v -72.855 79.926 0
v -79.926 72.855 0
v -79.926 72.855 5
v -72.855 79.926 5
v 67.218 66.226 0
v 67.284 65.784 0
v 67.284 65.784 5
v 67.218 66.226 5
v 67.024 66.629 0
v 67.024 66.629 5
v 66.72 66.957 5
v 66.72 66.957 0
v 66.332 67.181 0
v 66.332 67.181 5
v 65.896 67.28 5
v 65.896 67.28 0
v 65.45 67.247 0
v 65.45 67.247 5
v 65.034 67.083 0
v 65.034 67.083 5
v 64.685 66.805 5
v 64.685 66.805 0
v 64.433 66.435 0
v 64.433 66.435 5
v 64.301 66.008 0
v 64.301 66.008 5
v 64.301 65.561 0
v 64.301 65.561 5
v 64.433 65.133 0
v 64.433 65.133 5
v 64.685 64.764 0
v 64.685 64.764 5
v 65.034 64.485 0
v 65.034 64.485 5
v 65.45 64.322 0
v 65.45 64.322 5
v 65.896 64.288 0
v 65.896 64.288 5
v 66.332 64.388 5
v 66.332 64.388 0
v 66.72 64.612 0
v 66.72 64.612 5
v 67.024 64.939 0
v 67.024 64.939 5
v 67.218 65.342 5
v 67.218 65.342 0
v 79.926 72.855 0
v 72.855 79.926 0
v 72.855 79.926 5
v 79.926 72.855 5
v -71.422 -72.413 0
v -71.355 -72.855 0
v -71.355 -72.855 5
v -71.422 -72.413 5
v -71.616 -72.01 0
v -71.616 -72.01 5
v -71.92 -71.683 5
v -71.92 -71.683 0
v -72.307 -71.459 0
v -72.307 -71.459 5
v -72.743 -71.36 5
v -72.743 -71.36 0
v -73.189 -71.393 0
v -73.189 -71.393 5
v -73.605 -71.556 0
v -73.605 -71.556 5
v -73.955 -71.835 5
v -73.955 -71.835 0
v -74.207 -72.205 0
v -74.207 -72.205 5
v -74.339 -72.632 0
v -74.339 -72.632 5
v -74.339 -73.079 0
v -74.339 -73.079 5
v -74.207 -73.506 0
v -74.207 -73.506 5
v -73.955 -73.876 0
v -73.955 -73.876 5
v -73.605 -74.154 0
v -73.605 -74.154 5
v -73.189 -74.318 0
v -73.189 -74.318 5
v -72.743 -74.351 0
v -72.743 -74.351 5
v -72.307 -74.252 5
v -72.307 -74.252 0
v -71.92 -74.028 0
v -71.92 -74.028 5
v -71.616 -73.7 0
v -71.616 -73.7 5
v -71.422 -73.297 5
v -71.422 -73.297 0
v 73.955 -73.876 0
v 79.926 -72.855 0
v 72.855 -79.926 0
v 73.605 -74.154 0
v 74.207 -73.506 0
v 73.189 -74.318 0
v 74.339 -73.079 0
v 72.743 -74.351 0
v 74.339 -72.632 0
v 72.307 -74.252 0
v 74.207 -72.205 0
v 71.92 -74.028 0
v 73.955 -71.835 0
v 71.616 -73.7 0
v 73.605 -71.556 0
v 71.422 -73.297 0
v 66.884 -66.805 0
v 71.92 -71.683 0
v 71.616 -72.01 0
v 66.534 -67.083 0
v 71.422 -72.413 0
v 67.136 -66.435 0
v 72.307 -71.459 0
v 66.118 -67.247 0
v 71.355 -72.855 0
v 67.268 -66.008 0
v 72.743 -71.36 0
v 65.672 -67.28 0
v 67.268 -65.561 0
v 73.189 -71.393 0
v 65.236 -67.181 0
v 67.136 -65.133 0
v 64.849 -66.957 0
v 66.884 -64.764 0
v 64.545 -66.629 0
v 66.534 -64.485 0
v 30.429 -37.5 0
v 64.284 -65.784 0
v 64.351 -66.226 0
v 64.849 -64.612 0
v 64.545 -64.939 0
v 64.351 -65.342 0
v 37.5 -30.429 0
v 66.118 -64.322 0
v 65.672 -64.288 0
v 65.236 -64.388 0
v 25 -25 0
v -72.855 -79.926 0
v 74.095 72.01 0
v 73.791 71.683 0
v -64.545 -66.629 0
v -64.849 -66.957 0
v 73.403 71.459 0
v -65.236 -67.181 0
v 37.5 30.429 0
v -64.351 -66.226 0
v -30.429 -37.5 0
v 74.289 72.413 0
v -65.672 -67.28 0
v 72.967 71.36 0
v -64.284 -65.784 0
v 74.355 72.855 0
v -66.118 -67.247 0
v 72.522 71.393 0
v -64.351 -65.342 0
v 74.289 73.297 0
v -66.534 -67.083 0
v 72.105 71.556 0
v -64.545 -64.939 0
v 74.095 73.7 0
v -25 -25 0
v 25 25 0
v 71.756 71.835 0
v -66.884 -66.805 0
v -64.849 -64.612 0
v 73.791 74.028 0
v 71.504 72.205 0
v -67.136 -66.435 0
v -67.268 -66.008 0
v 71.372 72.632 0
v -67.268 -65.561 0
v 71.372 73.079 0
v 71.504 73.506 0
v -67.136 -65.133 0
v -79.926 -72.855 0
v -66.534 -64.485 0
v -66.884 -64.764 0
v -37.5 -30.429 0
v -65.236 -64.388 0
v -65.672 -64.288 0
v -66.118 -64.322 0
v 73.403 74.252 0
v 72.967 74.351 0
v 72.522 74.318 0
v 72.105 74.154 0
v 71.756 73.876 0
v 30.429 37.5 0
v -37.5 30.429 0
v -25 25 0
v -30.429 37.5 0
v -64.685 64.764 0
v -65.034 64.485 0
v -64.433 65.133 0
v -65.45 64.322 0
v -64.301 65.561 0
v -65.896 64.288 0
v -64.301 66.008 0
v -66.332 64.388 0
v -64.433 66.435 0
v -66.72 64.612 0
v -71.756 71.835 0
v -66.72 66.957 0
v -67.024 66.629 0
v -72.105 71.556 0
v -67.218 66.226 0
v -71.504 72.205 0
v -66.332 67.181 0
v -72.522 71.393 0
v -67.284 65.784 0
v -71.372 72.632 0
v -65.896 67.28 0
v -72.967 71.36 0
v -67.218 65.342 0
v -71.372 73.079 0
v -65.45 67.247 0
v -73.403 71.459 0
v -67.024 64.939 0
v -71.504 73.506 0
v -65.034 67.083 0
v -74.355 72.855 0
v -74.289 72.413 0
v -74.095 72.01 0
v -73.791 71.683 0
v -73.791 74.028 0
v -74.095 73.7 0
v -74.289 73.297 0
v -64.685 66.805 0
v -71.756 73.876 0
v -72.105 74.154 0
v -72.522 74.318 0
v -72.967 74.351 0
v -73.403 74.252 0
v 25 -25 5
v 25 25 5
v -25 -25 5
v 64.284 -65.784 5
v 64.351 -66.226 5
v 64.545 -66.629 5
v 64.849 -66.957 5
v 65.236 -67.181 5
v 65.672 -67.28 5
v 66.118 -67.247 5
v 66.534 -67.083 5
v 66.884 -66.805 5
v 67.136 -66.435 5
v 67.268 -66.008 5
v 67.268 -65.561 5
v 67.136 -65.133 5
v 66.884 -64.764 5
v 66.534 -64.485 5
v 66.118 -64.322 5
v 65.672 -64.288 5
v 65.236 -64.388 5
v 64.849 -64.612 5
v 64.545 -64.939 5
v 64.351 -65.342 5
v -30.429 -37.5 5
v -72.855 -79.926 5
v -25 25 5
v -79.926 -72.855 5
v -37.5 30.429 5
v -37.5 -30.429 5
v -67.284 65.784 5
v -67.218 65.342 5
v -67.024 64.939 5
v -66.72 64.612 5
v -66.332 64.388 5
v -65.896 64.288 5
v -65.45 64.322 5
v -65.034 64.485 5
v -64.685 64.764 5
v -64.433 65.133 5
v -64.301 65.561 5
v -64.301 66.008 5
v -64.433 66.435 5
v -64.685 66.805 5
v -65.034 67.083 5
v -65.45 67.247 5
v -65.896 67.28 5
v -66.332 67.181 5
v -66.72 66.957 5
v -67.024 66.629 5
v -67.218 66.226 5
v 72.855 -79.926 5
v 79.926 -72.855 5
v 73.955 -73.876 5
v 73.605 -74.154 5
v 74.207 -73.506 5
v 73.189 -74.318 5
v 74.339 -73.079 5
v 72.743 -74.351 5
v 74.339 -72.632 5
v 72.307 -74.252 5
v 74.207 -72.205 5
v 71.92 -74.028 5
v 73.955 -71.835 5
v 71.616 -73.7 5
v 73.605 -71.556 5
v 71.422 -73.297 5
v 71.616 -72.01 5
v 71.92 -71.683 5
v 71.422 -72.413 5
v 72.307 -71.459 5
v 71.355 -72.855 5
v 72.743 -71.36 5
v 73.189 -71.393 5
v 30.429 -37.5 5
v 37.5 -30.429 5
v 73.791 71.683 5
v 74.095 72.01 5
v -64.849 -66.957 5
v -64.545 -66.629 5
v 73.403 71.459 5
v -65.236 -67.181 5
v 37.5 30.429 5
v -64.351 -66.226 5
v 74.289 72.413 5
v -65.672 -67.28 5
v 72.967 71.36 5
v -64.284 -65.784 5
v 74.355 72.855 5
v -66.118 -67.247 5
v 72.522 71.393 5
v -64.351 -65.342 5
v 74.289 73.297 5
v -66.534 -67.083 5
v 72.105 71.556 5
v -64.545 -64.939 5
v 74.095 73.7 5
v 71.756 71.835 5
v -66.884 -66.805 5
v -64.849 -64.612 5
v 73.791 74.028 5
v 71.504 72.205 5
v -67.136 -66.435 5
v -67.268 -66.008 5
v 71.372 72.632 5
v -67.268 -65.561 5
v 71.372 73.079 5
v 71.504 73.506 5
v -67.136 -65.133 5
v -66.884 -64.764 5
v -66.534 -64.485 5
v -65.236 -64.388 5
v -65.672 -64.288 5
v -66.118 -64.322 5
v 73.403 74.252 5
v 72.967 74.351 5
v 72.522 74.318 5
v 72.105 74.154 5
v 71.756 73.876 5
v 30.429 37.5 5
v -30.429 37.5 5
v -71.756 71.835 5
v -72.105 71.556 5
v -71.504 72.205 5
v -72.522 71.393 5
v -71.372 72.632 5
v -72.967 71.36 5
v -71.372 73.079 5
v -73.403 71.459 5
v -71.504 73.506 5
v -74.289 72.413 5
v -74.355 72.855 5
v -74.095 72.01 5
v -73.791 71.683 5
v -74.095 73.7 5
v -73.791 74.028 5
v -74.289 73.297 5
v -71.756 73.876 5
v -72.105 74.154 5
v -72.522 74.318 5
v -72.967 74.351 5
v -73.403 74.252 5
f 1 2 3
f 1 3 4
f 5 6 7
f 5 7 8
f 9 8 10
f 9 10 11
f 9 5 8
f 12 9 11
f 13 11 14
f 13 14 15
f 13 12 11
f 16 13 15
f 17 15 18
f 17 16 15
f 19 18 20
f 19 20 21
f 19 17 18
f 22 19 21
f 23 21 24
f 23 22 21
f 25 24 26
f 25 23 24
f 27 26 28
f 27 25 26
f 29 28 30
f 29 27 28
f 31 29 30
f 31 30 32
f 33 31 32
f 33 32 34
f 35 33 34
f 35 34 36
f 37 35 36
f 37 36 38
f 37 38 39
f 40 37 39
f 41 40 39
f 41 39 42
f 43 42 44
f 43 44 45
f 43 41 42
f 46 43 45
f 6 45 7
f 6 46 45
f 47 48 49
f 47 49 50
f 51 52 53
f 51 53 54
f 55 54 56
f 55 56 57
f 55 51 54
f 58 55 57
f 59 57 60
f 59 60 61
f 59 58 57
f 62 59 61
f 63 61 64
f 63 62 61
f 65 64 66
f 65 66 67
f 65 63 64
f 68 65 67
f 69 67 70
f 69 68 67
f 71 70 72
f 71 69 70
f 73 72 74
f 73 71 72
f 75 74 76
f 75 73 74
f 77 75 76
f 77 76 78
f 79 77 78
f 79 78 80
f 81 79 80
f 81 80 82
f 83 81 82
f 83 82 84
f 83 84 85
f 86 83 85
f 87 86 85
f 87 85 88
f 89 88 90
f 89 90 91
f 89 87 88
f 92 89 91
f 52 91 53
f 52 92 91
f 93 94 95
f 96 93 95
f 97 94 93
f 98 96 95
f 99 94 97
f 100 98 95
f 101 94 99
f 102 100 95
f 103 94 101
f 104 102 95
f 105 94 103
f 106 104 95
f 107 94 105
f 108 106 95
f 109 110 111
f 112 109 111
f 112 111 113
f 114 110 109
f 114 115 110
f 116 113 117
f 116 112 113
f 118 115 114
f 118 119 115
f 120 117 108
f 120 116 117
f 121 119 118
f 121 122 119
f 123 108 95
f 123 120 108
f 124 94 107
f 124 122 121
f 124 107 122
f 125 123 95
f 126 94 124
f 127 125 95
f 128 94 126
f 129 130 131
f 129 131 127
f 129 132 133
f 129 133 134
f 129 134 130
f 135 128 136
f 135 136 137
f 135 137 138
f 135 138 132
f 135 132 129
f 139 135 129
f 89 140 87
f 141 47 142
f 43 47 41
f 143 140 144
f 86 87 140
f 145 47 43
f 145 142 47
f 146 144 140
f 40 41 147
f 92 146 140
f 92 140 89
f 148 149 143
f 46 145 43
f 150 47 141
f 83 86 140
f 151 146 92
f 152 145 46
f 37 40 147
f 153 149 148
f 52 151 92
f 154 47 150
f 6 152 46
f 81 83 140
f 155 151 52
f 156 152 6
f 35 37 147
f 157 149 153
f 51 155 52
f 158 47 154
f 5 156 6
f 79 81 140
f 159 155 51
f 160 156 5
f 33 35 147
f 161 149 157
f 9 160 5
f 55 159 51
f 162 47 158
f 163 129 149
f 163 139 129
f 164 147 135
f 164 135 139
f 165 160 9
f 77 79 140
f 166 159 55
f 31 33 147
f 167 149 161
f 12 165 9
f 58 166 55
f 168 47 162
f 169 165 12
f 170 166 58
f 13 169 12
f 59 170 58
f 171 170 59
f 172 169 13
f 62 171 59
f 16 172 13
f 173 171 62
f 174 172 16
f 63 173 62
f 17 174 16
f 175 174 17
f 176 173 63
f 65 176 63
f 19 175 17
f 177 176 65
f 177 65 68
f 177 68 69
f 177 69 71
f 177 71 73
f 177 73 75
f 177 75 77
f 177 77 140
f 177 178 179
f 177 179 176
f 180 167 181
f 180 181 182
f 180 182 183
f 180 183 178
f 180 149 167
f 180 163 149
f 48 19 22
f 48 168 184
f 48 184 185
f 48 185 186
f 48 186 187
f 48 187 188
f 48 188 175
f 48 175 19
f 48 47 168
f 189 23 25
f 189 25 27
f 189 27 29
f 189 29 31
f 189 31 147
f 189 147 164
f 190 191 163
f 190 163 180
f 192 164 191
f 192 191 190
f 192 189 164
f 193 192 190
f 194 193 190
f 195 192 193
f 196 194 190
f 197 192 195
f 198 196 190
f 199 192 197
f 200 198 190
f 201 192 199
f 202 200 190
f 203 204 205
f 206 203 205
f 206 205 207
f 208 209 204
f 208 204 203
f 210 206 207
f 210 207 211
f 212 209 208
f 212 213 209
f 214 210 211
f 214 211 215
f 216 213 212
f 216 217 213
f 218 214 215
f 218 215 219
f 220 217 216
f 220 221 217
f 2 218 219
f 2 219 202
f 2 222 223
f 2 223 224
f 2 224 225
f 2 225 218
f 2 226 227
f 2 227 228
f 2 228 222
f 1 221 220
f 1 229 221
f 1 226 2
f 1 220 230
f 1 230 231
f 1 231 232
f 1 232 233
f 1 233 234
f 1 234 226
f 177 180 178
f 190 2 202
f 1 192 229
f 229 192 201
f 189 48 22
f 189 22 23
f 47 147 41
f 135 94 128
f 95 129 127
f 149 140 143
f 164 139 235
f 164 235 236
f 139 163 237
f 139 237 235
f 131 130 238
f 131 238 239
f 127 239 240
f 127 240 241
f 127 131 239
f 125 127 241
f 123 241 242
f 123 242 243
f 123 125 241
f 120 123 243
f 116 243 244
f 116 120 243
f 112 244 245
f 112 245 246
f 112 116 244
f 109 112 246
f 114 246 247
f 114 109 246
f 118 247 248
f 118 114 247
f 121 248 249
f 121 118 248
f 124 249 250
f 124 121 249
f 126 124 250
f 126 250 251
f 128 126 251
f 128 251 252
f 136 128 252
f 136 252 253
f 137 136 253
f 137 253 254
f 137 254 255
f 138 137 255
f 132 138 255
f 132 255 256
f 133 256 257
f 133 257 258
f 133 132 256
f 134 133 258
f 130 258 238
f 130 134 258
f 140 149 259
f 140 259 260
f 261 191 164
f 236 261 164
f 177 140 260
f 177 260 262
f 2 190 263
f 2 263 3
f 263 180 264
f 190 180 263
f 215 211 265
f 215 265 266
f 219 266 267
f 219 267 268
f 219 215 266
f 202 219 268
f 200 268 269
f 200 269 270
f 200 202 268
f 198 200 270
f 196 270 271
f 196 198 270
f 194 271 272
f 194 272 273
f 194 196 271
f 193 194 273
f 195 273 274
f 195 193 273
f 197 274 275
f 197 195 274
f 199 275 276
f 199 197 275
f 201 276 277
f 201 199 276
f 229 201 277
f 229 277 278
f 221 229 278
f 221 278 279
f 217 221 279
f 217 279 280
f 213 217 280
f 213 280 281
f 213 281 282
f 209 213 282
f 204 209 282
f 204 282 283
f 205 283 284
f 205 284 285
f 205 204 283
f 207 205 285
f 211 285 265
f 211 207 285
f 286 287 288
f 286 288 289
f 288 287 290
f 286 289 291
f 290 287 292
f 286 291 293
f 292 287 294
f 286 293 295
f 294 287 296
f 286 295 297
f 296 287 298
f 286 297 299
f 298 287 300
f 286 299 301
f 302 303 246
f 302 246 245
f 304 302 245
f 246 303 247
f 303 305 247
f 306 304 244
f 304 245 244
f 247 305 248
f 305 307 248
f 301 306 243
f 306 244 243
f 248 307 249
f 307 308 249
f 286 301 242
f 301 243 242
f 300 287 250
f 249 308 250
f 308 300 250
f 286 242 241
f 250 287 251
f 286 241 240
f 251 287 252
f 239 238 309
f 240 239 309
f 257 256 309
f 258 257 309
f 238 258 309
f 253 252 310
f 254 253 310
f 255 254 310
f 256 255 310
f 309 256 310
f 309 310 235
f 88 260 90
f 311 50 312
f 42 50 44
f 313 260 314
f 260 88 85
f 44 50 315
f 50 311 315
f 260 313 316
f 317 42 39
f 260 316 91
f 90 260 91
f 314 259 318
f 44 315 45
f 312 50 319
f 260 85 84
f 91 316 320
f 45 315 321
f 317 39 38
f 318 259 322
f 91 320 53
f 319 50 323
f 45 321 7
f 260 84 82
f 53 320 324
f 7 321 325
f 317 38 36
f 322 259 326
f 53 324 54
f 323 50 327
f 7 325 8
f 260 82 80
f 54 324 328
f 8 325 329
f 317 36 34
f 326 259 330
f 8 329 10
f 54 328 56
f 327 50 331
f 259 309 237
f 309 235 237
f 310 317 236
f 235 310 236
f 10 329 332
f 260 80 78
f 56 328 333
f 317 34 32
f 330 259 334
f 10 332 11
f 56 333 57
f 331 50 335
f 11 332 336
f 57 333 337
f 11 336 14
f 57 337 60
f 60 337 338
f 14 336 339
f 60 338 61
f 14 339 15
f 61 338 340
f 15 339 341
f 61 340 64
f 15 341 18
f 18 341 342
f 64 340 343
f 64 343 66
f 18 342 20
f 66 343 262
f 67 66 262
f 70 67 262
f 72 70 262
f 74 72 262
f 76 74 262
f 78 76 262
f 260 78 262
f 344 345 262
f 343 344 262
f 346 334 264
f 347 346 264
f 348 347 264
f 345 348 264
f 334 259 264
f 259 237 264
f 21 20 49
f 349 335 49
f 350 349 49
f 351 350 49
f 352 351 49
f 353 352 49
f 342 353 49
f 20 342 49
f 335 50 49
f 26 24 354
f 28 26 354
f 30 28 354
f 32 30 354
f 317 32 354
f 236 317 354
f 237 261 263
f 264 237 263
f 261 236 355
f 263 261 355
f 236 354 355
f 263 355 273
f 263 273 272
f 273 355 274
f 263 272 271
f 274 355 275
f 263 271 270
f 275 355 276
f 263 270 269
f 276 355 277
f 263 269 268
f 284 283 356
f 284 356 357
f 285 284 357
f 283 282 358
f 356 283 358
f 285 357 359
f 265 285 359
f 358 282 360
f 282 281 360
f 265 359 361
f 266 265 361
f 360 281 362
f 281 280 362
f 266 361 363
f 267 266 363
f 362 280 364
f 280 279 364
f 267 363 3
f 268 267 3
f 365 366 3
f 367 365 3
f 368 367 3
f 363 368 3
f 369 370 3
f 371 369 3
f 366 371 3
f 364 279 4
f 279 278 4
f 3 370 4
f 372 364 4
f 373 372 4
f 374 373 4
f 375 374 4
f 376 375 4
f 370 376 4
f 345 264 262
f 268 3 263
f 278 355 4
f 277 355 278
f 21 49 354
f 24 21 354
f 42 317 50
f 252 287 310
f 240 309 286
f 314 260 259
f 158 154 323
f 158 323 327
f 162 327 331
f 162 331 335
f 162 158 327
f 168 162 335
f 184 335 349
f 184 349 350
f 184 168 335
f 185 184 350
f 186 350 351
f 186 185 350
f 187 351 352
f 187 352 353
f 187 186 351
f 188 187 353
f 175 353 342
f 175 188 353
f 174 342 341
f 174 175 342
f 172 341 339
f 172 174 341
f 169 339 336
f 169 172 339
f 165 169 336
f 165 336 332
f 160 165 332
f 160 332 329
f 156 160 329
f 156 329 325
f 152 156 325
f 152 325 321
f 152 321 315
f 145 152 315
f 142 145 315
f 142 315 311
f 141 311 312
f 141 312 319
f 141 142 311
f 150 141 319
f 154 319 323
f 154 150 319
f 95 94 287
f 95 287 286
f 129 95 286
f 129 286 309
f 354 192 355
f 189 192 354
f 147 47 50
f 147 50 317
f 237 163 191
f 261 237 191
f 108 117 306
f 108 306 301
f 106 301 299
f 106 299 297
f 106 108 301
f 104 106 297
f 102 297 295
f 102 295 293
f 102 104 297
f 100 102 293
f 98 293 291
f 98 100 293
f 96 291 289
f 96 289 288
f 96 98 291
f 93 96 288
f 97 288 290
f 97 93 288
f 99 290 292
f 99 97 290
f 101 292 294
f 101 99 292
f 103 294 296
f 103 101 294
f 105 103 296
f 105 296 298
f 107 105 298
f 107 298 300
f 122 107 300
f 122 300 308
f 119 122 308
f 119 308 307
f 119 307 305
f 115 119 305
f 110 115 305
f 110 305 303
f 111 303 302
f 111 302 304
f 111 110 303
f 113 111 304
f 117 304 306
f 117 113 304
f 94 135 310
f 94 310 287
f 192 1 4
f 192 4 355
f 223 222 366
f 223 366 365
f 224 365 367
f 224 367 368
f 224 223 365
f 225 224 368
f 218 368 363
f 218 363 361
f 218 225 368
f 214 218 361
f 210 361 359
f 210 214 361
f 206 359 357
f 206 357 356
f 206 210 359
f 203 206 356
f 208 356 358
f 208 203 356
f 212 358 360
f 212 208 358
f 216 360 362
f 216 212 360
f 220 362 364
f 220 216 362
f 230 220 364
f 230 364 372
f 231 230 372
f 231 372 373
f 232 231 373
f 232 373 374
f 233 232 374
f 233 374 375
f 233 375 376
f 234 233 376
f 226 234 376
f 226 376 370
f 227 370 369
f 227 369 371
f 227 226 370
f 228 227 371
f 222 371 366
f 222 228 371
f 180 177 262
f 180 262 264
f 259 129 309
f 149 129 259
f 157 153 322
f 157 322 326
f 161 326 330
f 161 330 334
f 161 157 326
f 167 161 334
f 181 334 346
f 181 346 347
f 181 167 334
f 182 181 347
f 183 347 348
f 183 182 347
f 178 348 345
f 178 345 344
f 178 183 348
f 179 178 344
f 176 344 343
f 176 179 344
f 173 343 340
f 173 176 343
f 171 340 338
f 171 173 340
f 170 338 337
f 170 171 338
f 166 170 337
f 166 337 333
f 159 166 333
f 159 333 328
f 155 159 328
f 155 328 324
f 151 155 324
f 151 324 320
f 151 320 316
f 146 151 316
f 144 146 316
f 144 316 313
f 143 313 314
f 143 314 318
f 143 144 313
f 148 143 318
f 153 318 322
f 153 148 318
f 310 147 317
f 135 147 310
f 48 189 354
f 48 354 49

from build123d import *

# Parameters (mm, degrees)
SKETCH1_R           = 1.5
SKETCH1_W           = 50
SKETCH1_H           = 50
BOSS_EXTRUDE1_DEPTH = 5


with BuildPart() as part:
    # Sketch1 → Boss-Extrude1 (new body)
    with BuildSketch(Plane.XY):
        Polygon((-79.926406871, -72.855339059), (-37.5, -30.428932188), (-37.5, 30.428932188), (-79.926406871, 72.855339059), (-72.855339059, 79.926406871), (-30.428932188, 37.5), (30.428932188, 37.5), (72.855339059, 79.926406871), (79.926406871, 72.855339059), (37.5, 30.428932188), (37.5, -30.428932188), (79.926406871, -72.855339059), (72.855339059, -79.926406871), (30.428932188, -37.5), (-30.428932188, -37.5), (-72.855339059, -79.926406871), align=None)
        with Locations((72.855339059, 72.855339059)):
            Circle(SKETCH1_R, mode=Mode.SUBTRACT)
        with Locations((65.784271247, 65.784271247)):
            Circle(SKETCH1_R, mode=Mode.SUBTRACT)
        with Locations(Location((-65.784271247, 65.784271247, 0), (0, 0, 180))):
            Circle(SKETCH1_R, mode=Mode.SUBTRACT)
        with Locations(Location((-72.855339059, 72.855339059, 0), (0, 0, 180))):
            Circle(SKETCH1_R, mode=Mode.SUBTRACT)
        with Locations(Location((72.855339059, -72.855339059, 0), (0, 0, 180))):
            Circle(SKETCH1_R, mode=Mode.SUBTRACT)
        with Locations(Location((65.784271247, -65.784271247, 0), (0, 0, 180))):
            Circle(SKETCH1_R, mode=Mode.SUBTRACT)
        with Locations((-72.855339059, -72.855339059)):
            Circle(SKETCH1_R, mode=Mode.SUBTRACT)
        with Locations((-65.784271247, -65.784271247)):
            Circle(SKETCH1_R, mode=Mode.SUBTRACT)
        Rectangle(SKETCH1_W, SKETCH1_H, mode=Mode.SUBTRACT)
    extrude(amount=BOSS_EXTRUDE1_DEPTH)


solid = part.part
